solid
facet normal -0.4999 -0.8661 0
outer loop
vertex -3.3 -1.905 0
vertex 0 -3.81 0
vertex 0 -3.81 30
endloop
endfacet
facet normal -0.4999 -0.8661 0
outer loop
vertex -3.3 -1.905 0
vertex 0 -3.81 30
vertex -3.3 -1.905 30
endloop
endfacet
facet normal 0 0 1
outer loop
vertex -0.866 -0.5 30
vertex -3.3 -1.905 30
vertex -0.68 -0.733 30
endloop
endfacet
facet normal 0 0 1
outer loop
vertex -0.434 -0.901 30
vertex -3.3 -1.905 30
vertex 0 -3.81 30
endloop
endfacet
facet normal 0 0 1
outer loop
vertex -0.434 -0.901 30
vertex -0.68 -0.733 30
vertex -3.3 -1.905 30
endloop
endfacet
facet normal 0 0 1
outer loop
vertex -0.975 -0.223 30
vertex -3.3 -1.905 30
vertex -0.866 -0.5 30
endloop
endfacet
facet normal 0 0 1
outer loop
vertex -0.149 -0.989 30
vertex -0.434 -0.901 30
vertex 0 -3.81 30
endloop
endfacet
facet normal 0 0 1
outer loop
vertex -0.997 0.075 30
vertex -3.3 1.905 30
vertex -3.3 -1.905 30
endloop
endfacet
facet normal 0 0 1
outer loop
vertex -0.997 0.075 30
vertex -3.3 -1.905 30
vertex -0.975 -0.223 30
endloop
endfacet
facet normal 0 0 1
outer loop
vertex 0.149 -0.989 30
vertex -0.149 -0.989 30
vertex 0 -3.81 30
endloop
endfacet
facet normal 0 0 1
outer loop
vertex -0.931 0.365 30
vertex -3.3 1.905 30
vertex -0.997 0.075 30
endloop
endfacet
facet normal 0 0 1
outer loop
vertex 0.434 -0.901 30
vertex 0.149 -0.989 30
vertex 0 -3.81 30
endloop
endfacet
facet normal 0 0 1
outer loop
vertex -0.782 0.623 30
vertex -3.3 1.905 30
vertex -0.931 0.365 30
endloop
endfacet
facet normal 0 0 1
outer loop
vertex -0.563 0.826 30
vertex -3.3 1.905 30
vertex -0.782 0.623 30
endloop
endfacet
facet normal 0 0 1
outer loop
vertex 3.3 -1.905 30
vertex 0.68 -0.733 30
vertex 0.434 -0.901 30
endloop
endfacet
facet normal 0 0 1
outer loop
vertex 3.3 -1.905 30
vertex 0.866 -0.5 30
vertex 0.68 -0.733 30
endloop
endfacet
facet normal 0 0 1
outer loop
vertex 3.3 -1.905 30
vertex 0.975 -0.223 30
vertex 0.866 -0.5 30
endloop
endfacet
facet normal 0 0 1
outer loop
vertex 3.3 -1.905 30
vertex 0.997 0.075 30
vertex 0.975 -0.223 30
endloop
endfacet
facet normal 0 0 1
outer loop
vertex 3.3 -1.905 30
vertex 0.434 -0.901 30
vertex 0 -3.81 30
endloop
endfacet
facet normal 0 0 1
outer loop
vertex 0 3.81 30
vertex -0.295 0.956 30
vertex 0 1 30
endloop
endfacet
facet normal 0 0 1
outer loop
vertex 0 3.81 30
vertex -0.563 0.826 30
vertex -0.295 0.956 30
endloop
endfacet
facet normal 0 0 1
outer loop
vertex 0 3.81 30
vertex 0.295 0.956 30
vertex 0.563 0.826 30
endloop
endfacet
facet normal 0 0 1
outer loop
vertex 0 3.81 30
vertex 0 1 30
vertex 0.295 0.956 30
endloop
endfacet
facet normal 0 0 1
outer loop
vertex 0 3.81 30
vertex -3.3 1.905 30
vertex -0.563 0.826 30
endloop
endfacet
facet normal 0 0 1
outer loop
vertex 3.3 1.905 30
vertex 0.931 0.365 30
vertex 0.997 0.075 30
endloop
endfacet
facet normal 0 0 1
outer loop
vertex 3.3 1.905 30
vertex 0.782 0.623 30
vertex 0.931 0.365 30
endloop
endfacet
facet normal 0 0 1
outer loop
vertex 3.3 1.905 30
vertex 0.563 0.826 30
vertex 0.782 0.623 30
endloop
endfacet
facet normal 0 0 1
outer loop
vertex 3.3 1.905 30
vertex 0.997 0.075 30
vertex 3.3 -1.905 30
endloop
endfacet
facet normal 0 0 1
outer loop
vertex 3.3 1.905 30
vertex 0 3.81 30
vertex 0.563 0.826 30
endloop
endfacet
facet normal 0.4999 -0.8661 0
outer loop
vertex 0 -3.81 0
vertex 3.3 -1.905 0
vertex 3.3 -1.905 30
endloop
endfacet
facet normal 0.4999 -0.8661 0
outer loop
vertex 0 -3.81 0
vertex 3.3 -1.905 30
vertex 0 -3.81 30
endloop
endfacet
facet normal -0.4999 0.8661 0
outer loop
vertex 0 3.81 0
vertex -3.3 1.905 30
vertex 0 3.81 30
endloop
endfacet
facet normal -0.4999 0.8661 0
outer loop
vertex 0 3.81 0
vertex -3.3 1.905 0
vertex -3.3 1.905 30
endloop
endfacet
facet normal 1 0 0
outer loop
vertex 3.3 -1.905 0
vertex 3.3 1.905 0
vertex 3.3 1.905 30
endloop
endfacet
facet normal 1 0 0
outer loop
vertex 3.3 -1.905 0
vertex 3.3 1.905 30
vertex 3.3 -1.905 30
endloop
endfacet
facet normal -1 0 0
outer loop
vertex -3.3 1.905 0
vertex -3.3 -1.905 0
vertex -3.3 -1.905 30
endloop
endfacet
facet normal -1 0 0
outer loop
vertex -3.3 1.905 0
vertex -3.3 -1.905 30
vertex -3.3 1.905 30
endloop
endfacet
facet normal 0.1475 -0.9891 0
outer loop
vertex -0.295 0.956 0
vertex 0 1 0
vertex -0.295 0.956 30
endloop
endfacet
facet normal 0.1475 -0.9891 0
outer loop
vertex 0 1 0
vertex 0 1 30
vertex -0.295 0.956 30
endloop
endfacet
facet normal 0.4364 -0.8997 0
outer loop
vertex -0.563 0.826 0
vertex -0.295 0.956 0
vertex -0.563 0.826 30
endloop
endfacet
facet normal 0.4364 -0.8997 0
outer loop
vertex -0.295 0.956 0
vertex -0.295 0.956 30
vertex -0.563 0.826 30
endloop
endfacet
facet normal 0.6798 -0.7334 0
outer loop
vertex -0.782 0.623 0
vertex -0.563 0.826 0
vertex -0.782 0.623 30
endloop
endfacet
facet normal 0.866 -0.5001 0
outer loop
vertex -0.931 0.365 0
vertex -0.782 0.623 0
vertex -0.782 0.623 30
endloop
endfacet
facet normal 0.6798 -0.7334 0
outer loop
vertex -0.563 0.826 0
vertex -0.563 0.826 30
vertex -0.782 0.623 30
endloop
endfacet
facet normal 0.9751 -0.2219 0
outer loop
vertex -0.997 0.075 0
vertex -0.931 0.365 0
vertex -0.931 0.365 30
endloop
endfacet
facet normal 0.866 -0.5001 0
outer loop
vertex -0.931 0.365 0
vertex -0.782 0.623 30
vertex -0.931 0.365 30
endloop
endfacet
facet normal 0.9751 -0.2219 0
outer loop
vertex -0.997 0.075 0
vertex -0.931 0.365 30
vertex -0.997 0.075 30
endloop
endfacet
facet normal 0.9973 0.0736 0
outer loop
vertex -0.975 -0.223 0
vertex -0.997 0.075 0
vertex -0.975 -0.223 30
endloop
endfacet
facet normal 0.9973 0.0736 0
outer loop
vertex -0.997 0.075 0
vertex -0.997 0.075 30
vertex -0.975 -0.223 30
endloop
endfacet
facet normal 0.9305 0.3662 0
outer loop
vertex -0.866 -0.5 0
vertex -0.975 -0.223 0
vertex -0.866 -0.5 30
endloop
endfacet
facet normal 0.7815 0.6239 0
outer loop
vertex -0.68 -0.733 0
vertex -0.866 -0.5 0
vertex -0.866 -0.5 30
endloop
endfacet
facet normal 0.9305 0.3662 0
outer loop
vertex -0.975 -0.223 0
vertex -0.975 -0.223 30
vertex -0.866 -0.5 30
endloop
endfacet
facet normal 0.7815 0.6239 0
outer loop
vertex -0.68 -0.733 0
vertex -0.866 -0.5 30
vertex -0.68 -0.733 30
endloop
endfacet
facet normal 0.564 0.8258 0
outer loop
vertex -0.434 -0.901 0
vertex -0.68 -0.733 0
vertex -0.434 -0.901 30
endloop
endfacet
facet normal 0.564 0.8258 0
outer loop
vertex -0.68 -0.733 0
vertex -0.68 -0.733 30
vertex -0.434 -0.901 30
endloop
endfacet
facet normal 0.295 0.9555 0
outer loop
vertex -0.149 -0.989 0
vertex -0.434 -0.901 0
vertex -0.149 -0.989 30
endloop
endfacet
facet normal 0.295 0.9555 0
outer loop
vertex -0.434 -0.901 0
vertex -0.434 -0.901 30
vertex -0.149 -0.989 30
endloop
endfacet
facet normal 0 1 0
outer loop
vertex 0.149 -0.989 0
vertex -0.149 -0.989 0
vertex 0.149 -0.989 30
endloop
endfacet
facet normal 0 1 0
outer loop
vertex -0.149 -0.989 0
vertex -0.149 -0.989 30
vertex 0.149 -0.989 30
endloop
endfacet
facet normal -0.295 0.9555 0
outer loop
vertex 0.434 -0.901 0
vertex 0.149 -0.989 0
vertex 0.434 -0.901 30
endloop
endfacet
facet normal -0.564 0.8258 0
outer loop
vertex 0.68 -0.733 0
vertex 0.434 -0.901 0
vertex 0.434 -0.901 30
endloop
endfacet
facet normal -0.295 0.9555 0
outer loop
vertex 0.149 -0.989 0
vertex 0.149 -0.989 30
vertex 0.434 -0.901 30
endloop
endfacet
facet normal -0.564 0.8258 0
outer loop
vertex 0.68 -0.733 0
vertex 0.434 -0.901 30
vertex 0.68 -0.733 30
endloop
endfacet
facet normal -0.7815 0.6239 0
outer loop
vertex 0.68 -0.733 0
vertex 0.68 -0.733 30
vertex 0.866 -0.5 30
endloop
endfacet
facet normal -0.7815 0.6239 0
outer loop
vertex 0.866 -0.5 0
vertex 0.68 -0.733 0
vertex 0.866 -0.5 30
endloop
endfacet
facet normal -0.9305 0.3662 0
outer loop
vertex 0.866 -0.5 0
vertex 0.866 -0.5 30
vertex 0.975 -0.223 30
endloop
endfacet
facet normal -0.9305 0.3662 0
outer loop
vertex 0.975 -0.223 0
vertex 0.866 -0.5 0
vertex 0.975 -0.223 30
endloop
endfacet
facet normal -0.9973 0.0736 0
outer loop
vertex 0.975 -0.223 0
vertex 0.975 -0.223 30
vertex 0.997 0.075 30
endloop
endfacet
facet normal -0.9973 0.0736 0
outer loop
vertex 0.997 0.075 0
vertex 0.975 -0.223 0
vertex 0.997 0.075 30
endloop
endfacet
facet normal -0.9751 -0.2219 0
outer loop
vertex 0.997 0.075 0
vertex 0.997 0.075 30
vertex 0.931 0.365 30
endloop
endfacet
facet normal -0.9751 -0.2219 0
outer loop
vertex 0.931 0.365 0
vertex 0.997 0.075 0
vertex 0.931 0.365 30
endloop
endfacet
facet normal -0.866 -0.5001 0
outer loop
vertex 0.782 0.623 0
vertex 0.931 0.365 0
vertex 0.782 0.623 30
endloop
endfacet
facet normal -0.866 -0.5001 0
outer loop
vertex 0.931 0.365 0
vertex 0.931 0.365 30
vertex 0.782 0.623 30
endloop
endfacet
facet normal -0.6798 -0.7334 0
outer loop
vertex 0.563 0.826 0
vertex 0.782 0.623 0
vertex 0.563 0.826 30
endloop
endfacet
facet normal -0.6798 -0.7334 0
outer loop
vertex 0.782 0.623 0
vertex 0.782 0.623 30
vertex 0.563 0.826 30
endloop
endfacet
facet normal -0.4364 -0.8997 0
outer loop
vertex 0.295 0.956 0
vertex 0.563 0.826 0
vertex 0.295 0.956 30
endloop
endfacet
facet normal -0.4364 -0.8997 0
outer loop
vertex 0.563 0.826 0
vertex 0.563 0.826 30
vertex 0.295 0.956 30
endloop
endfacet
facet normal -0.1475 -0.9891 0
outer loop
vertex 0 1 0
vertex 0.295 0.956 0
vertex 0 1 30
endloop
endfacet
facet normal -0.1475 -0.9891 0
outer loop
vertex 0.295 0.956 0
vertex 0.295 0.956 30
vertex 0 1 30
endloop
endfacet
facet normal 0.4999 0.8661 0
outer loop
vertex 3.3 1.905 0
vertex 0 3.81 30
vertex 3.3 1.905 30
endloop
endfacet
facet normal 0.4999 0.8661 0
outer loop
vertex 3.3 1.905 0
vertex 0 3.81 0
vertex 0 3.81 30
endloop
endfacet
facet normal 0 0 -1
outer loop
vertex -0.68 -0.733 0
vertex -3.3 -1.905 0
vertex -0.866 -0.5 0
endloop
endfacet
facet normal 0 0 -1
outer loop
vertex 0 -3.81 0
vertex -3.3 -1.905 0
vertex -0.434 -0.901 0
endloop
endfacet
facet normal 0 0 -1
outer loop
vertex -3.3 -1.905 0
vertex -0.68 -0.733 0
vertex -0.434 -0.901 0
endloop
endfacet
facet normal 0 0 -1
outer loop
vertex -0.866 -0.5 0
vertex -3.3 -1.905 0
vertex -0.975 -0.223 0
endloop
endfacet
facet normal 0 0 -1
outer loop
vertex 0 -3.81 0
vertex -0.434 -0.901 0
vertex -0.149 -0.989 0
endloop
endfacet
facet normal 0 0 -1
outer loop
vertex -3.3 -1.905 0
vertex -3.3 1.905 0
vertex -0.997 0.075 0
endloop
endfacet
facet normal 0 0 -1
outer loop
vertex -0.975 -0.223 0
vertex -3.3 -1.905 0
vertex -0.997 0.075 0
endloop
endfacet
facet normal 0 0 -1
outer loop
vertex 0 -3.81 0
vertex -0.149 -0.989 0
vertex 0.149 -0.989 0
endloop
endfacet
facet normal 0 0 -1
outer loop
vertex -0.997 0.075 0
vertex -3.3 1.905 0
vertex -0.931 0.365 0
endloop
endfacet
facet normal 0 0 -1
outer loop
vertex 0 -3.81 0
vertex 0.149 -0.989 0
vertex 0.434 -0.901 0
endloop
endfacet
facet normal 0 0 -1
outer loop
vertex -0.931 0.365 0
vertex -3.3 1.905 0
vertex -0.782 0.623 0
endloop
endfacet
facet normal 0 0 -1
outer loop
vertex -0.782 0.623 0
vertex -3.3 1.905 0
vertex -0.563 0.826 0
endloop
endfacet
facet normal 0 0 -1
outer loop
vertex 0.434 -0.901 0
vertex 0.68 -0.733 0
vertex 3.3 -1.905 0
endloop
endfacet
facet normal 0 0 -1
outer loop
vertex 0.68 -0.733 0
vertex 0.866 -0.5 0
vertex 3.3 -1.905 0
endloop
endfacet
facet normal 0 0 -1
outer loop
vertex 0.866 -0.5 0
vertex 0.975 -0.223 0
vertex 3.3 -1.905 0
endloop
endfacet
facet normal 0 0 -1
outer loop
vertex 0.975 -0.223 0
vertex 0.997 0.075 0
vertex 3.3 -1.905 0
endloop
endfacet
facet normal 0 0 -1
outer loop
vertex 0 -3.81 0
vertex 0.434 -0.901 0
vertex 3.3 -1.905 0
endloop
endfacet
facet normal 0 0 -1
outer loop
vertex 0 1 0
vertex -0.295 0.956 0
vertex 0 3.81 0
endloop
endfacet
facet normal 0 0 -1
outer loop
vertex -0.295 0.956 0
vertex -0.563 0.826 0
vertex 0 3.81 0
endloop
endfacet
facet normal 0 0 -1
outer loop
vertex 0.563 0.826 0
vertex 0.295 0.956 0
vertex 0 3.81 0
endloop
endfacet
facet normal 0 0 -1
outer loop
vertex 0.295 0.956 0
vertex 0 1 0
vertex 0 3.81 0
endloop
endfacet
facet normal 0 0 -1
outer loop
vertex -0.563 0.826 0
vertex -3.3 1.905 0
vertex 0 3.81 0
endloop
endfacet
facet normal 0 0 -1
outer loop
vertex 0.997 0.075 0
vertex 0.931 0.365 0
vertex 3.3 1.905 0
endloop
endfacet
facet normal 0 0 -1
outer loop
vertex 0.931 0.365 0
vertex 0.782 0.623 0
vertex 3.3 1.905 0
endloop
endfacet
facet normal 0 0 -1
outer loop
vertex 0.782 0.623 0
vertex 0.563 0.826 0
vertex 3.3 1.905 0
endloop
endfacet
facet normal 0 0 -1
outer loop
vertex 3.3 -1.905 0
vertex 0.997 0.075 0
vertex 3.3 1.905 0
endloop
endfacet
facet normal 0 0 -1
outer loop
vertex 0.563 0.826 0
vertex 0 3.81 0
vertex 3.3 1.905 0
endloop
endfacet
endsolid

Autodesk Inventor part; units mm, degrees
ref_plane "YZ Plane" through (0, 0, 0) normal (1, 0, 0) x (0, 1, 0)
ref_plane "XZ Plane" through (0, 0, 0) normal (0, 1, 0) x (-1, 0, 0)
ref_plane "XY Plane" through (0, 0, 0) normal (0, 0, 1) x (1, 0, 0)
sketch "Sketch1" plane through (0, 0, 0) normal (0, 0, 1) x (1, 0, 0)
  circle A0 centre (0, 0) radius 0.9 construction
  circle A1 centre (0, 0) radius 3.3 construction
  line L0 (3.3, -1.9053) -> (0, -3.8105)
  line L1 (0, -3.8105) -> (-3.3, -1.9053)
  line L2 (-3.3, -1.9053) -> (-3.3, 1.9053)
  line L3 (-3.3, 1.9053) -> (0, 3.8105)
  line L4 (0, 3.8105) -> (3.3, 1.9053)
  line L5 (3.3, 1.9053) -> (3.3, -1.9053)
  circle A2 centre (0, 0) radius 0.6
  point P0 (3.3, 0)
  dimension "d0" = 1.8
  dimension "d1" = 2.4
  dimension "d4" = 1.2
extrude "Extrusion1" add sketch "Sketch1" along normal blind 30
sketch "Sketch2" plane through (0, 0, 0) normal (0, 0, -1) x (-1, 0, 0)
  circle A0 centre (0, 0) radius 0.6 projected
hole "Hole1" at (0, 0, 0) direction (0, 0, 1) diameter 2 end through all
properties part number "Standoff_V1"
